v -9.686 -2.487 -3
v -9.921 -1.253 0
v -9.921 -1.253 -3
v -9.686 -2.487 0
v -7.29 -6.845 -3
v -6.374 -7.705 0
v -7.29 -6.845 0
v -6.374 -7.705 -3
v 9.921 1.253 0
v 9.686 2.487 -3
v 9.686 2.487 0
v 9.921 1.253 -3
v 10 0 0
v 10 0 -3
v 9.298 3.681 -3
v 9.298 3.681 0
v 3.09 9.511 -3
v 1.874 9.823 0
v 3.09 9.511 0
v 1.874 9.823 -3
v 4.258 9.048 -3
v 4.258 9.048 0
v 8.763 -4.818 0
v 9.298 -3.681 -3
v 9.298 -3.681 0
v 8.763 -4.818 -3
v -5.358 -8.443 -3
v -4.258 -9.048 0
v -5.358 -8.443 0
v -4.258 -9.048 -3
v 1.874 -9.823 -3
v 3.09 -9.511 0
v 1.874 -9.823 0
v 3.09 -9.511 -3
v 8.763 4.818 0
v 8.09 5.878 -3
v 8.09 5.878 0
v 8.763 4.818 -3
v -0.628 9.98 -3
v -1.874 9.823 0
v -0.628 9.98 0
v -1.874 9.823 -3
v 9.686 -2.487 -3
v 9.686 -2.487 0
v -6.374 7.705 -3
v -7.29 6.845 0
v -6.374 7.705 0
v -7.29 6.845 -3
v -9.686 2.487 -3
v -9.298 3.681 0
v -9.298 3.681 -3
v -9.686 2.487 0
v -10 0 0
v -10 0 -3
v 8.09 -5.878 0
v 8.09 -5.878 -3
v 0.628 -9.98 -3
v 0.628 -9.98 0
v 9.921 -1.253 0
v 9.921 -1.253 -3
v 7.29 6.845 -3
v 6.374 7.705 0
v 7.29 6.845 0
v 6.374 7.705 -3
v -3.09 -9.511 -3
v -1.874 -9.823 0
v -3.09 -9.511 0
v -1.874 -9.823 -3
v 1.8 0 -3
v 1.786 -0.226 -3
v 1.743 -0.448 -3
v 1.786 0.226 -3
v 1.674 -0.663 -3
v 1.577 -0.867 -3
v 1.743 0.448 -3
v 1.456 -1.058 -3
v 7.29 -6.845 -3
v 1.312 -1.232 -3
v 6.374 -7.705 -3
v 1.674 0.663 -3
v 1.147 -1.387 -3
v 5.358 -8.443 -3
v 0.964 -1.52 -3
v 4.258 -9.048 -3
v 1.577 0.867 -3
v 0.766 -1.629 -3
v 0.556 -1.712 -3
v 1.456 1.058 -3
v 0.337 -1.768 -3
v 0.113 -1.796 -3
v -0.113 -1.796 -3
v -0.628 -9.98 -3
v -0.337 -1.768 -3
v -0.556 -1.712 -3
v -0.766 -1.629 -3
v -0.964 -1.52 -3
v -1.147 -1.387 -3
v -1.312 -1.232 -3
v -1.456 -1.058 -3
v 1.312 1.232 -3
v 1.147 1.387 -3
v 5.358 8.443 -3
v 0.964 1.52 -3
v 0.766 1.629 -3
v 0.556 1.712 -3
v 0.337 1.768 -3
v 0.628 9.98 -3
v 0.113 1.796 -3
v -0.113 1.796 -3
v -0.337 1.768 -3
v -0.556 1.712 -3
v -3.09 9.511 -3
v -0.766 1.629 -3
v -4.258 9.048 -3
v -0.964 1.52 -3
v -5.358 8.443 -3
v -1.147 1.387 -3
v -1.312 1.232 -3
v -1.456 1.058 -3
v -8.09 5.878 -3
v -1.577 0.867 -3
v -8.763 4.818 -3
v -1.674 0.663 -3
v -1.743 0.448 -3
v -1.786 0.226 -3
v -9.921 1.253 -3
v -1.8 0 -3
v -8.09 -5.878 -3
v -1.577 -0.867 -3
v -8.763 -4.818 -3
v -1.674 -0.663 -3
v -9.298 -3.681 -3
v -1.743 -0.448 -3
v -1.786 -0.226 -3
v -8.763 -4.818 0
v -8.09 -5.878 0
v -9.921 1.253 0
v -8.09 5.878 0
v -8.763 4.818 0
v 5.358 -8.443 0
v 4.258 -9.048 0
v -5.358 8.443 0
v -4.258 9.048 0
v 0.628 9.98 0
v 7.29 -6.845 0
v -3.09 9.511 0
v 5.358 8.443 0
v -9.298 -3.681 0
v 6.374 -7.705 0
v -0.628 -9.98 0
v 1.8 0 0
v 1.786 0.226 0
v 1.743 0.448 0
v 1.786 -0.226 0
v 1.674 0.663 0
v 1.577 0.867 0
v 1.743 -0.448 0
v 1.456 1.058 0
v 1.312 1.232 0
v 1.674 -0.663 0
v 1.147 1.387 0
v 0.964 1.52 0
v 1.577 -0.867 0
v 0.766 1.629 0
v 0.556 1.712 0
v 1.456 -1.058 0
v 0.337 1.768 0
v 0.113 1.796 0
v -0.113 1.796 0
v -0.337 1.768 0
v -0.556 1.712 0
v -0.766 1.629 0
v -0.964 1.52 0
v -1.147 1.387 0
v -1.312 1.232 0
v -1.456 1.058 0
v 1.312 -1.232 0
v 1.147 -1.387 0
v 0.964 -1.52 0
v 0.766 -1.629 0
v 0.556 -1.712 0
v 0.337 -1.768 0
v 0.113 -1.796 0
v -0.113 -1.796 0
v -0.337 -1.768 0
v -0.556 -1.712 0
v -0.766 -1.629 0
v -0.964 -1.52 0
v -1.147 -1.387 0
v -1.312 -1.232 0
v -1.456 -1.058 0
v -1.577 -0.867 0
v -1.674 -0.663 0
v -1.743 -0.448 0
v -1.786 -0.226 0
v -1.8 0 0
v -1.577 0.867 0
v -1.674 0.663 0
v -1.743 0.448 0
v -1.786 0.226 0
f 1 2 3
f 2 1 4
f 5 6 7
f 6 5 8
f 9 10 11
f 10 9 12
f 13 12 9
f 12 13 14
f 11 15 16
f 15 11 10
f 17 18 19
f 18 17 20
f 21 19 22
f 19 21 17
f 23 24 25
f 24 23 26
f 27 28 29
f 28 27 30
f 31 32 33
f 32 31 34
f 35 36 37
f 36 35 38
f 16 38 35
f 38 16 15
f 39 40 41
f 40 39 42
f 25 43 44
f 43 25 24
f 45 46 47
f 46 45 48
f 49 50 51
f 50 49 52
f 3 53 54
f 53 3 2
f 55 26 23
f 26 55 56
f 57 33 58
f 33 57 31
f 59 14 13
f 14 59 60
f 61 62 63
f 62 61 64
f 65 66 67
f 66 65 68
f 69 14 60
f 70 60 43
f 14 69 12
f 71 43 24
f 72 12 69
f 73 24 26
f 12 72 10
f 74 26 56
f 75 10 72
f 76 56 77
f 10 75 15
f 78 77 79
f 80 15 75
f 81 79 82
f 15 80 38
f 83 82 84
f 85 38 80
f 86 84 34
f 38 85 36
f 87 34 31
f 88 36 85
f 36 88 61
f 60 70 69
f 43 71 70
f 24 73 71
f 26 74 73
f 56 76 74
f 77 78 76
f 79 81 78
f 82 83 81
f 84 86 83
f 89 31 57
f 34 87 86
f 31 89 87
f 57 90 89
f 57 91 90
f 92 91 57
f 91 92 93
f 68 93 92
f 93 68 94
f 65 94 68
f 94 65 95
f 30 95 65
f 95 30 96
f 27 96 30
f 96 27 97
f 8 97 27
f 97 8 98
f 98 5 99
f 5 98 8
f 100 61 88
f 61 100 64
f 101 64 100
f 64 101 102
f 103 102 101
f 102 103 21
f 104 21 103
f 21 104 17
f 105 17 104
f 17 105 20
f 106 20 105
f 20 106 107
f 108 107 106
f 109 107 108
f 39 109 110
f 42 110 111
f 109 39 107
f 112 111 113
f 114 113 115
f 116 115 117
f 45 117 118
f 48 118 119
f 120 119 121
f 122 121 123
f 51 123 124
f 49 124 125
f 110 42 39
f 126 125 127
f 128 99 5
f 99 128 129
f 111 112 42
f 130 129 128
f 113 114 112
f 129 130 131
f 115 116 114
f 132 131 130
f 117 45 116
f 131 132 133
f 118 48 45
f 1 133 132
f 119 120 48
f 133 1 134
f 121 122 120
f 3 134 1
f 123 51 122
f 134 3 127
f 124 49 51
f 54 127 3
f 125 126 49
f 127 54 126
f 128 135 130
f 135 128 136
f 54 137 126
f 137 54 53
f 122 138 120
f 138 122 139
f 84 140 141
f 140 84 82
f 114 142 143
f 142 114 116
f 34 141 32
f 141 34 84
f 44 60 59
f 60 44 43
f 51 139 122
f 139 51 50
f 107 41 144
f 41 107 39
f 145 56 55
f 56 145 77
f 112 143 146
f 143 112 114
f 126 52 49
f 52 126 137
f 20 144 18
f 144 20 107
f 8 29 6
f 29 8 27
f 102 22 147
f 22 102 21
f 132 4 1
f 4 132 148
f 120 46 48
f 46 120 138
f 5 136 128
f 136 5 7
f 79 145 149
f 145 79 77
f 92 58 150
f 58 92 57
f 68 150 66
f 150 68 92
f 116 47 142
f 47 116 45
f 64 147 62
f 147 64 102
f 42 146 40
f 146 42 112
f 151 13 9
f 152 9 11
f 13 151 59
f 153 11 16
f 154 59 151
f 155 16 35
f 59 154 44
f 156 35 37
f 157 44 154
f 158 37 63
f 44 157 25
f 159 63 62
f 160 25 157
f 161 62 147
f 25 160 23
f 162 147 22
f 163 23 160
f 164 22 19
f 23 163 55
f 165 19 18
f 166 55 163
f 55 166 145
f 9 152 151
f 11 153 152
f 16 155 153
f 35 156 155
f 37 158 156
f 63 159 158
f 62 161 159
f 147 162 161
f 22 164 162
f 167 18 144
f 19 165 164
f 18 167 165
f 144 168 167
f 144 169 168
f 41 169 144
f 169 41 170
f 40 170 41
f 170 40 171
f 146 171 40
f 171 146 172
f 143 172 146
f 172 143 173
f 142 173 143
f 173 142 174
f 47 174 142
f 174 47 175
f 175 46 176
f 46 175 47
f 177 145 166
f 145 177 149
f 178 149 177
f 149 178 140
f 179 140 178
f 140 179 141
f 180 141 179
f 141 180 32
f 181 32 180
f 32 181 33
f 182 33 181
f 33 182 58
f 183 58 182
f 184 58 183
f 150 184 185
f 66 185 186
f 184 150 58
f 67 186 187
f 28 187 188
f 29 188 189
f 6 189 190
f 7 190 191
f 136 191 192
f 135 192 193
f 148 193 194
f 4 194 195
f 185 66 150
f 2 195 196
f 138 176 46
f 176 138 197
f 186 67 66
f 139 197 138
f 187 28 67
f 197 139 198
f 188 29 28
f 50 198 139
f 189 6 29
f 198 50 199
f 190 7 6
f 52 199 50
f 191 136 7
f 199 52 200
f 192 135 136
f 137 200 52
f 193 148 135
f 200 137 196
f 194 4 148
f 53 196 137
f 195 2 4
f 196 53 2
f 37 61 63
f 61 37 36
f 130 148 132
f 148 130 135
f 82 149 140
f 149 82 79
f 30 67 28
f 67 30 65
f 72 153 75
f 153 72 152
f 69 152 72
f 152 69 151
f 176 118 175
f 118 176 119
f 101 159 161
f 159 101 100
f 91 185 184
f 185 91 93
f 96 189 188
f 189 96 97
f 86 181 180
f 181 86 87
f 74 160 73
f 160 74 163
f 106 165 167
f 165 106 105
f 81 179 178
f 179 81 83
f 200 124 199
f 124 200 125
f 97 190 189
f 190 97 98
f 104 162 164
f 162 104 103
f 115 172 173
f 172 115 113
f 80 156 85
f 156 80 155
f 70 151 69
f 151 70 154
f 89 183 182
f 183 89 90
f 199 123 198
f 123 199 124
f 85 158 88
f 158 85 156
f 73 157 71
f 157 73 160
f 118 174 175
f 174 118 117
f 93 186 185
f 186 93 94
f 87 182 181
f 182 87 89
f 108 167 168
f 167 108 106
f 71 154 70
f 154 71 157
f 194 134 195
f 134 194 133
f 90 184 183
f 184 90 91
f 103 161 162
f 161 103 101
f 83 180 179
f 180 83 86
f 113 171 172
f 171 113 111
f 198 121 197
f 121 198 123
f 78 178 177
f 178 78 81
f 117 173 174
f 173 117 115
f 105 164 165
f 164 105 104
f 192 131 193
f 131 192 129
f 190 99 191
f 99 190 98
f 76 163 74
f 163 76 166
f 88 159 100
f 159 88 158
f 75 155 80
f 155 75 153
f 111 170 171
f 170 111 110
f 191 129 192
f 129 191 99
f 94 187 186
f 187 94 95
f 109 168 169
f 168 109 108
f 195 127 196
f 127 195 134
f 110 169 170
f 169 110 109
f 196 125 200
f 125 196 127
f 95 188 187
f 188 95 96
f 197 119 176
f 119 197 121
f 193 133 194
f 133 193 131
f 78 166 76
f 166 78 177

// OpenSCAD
$fn = 50;


difference() {
	union() {
		translate(v = [0, 0, -3.0000000000]) {
			cylinder(h = 3, r = 10.0000000000);
		}
	}
	union() {
		#translate(v = [0, 0, -3]) {
			cylinder(h = 3, r = 1.8000000000);
		}
	}
}
